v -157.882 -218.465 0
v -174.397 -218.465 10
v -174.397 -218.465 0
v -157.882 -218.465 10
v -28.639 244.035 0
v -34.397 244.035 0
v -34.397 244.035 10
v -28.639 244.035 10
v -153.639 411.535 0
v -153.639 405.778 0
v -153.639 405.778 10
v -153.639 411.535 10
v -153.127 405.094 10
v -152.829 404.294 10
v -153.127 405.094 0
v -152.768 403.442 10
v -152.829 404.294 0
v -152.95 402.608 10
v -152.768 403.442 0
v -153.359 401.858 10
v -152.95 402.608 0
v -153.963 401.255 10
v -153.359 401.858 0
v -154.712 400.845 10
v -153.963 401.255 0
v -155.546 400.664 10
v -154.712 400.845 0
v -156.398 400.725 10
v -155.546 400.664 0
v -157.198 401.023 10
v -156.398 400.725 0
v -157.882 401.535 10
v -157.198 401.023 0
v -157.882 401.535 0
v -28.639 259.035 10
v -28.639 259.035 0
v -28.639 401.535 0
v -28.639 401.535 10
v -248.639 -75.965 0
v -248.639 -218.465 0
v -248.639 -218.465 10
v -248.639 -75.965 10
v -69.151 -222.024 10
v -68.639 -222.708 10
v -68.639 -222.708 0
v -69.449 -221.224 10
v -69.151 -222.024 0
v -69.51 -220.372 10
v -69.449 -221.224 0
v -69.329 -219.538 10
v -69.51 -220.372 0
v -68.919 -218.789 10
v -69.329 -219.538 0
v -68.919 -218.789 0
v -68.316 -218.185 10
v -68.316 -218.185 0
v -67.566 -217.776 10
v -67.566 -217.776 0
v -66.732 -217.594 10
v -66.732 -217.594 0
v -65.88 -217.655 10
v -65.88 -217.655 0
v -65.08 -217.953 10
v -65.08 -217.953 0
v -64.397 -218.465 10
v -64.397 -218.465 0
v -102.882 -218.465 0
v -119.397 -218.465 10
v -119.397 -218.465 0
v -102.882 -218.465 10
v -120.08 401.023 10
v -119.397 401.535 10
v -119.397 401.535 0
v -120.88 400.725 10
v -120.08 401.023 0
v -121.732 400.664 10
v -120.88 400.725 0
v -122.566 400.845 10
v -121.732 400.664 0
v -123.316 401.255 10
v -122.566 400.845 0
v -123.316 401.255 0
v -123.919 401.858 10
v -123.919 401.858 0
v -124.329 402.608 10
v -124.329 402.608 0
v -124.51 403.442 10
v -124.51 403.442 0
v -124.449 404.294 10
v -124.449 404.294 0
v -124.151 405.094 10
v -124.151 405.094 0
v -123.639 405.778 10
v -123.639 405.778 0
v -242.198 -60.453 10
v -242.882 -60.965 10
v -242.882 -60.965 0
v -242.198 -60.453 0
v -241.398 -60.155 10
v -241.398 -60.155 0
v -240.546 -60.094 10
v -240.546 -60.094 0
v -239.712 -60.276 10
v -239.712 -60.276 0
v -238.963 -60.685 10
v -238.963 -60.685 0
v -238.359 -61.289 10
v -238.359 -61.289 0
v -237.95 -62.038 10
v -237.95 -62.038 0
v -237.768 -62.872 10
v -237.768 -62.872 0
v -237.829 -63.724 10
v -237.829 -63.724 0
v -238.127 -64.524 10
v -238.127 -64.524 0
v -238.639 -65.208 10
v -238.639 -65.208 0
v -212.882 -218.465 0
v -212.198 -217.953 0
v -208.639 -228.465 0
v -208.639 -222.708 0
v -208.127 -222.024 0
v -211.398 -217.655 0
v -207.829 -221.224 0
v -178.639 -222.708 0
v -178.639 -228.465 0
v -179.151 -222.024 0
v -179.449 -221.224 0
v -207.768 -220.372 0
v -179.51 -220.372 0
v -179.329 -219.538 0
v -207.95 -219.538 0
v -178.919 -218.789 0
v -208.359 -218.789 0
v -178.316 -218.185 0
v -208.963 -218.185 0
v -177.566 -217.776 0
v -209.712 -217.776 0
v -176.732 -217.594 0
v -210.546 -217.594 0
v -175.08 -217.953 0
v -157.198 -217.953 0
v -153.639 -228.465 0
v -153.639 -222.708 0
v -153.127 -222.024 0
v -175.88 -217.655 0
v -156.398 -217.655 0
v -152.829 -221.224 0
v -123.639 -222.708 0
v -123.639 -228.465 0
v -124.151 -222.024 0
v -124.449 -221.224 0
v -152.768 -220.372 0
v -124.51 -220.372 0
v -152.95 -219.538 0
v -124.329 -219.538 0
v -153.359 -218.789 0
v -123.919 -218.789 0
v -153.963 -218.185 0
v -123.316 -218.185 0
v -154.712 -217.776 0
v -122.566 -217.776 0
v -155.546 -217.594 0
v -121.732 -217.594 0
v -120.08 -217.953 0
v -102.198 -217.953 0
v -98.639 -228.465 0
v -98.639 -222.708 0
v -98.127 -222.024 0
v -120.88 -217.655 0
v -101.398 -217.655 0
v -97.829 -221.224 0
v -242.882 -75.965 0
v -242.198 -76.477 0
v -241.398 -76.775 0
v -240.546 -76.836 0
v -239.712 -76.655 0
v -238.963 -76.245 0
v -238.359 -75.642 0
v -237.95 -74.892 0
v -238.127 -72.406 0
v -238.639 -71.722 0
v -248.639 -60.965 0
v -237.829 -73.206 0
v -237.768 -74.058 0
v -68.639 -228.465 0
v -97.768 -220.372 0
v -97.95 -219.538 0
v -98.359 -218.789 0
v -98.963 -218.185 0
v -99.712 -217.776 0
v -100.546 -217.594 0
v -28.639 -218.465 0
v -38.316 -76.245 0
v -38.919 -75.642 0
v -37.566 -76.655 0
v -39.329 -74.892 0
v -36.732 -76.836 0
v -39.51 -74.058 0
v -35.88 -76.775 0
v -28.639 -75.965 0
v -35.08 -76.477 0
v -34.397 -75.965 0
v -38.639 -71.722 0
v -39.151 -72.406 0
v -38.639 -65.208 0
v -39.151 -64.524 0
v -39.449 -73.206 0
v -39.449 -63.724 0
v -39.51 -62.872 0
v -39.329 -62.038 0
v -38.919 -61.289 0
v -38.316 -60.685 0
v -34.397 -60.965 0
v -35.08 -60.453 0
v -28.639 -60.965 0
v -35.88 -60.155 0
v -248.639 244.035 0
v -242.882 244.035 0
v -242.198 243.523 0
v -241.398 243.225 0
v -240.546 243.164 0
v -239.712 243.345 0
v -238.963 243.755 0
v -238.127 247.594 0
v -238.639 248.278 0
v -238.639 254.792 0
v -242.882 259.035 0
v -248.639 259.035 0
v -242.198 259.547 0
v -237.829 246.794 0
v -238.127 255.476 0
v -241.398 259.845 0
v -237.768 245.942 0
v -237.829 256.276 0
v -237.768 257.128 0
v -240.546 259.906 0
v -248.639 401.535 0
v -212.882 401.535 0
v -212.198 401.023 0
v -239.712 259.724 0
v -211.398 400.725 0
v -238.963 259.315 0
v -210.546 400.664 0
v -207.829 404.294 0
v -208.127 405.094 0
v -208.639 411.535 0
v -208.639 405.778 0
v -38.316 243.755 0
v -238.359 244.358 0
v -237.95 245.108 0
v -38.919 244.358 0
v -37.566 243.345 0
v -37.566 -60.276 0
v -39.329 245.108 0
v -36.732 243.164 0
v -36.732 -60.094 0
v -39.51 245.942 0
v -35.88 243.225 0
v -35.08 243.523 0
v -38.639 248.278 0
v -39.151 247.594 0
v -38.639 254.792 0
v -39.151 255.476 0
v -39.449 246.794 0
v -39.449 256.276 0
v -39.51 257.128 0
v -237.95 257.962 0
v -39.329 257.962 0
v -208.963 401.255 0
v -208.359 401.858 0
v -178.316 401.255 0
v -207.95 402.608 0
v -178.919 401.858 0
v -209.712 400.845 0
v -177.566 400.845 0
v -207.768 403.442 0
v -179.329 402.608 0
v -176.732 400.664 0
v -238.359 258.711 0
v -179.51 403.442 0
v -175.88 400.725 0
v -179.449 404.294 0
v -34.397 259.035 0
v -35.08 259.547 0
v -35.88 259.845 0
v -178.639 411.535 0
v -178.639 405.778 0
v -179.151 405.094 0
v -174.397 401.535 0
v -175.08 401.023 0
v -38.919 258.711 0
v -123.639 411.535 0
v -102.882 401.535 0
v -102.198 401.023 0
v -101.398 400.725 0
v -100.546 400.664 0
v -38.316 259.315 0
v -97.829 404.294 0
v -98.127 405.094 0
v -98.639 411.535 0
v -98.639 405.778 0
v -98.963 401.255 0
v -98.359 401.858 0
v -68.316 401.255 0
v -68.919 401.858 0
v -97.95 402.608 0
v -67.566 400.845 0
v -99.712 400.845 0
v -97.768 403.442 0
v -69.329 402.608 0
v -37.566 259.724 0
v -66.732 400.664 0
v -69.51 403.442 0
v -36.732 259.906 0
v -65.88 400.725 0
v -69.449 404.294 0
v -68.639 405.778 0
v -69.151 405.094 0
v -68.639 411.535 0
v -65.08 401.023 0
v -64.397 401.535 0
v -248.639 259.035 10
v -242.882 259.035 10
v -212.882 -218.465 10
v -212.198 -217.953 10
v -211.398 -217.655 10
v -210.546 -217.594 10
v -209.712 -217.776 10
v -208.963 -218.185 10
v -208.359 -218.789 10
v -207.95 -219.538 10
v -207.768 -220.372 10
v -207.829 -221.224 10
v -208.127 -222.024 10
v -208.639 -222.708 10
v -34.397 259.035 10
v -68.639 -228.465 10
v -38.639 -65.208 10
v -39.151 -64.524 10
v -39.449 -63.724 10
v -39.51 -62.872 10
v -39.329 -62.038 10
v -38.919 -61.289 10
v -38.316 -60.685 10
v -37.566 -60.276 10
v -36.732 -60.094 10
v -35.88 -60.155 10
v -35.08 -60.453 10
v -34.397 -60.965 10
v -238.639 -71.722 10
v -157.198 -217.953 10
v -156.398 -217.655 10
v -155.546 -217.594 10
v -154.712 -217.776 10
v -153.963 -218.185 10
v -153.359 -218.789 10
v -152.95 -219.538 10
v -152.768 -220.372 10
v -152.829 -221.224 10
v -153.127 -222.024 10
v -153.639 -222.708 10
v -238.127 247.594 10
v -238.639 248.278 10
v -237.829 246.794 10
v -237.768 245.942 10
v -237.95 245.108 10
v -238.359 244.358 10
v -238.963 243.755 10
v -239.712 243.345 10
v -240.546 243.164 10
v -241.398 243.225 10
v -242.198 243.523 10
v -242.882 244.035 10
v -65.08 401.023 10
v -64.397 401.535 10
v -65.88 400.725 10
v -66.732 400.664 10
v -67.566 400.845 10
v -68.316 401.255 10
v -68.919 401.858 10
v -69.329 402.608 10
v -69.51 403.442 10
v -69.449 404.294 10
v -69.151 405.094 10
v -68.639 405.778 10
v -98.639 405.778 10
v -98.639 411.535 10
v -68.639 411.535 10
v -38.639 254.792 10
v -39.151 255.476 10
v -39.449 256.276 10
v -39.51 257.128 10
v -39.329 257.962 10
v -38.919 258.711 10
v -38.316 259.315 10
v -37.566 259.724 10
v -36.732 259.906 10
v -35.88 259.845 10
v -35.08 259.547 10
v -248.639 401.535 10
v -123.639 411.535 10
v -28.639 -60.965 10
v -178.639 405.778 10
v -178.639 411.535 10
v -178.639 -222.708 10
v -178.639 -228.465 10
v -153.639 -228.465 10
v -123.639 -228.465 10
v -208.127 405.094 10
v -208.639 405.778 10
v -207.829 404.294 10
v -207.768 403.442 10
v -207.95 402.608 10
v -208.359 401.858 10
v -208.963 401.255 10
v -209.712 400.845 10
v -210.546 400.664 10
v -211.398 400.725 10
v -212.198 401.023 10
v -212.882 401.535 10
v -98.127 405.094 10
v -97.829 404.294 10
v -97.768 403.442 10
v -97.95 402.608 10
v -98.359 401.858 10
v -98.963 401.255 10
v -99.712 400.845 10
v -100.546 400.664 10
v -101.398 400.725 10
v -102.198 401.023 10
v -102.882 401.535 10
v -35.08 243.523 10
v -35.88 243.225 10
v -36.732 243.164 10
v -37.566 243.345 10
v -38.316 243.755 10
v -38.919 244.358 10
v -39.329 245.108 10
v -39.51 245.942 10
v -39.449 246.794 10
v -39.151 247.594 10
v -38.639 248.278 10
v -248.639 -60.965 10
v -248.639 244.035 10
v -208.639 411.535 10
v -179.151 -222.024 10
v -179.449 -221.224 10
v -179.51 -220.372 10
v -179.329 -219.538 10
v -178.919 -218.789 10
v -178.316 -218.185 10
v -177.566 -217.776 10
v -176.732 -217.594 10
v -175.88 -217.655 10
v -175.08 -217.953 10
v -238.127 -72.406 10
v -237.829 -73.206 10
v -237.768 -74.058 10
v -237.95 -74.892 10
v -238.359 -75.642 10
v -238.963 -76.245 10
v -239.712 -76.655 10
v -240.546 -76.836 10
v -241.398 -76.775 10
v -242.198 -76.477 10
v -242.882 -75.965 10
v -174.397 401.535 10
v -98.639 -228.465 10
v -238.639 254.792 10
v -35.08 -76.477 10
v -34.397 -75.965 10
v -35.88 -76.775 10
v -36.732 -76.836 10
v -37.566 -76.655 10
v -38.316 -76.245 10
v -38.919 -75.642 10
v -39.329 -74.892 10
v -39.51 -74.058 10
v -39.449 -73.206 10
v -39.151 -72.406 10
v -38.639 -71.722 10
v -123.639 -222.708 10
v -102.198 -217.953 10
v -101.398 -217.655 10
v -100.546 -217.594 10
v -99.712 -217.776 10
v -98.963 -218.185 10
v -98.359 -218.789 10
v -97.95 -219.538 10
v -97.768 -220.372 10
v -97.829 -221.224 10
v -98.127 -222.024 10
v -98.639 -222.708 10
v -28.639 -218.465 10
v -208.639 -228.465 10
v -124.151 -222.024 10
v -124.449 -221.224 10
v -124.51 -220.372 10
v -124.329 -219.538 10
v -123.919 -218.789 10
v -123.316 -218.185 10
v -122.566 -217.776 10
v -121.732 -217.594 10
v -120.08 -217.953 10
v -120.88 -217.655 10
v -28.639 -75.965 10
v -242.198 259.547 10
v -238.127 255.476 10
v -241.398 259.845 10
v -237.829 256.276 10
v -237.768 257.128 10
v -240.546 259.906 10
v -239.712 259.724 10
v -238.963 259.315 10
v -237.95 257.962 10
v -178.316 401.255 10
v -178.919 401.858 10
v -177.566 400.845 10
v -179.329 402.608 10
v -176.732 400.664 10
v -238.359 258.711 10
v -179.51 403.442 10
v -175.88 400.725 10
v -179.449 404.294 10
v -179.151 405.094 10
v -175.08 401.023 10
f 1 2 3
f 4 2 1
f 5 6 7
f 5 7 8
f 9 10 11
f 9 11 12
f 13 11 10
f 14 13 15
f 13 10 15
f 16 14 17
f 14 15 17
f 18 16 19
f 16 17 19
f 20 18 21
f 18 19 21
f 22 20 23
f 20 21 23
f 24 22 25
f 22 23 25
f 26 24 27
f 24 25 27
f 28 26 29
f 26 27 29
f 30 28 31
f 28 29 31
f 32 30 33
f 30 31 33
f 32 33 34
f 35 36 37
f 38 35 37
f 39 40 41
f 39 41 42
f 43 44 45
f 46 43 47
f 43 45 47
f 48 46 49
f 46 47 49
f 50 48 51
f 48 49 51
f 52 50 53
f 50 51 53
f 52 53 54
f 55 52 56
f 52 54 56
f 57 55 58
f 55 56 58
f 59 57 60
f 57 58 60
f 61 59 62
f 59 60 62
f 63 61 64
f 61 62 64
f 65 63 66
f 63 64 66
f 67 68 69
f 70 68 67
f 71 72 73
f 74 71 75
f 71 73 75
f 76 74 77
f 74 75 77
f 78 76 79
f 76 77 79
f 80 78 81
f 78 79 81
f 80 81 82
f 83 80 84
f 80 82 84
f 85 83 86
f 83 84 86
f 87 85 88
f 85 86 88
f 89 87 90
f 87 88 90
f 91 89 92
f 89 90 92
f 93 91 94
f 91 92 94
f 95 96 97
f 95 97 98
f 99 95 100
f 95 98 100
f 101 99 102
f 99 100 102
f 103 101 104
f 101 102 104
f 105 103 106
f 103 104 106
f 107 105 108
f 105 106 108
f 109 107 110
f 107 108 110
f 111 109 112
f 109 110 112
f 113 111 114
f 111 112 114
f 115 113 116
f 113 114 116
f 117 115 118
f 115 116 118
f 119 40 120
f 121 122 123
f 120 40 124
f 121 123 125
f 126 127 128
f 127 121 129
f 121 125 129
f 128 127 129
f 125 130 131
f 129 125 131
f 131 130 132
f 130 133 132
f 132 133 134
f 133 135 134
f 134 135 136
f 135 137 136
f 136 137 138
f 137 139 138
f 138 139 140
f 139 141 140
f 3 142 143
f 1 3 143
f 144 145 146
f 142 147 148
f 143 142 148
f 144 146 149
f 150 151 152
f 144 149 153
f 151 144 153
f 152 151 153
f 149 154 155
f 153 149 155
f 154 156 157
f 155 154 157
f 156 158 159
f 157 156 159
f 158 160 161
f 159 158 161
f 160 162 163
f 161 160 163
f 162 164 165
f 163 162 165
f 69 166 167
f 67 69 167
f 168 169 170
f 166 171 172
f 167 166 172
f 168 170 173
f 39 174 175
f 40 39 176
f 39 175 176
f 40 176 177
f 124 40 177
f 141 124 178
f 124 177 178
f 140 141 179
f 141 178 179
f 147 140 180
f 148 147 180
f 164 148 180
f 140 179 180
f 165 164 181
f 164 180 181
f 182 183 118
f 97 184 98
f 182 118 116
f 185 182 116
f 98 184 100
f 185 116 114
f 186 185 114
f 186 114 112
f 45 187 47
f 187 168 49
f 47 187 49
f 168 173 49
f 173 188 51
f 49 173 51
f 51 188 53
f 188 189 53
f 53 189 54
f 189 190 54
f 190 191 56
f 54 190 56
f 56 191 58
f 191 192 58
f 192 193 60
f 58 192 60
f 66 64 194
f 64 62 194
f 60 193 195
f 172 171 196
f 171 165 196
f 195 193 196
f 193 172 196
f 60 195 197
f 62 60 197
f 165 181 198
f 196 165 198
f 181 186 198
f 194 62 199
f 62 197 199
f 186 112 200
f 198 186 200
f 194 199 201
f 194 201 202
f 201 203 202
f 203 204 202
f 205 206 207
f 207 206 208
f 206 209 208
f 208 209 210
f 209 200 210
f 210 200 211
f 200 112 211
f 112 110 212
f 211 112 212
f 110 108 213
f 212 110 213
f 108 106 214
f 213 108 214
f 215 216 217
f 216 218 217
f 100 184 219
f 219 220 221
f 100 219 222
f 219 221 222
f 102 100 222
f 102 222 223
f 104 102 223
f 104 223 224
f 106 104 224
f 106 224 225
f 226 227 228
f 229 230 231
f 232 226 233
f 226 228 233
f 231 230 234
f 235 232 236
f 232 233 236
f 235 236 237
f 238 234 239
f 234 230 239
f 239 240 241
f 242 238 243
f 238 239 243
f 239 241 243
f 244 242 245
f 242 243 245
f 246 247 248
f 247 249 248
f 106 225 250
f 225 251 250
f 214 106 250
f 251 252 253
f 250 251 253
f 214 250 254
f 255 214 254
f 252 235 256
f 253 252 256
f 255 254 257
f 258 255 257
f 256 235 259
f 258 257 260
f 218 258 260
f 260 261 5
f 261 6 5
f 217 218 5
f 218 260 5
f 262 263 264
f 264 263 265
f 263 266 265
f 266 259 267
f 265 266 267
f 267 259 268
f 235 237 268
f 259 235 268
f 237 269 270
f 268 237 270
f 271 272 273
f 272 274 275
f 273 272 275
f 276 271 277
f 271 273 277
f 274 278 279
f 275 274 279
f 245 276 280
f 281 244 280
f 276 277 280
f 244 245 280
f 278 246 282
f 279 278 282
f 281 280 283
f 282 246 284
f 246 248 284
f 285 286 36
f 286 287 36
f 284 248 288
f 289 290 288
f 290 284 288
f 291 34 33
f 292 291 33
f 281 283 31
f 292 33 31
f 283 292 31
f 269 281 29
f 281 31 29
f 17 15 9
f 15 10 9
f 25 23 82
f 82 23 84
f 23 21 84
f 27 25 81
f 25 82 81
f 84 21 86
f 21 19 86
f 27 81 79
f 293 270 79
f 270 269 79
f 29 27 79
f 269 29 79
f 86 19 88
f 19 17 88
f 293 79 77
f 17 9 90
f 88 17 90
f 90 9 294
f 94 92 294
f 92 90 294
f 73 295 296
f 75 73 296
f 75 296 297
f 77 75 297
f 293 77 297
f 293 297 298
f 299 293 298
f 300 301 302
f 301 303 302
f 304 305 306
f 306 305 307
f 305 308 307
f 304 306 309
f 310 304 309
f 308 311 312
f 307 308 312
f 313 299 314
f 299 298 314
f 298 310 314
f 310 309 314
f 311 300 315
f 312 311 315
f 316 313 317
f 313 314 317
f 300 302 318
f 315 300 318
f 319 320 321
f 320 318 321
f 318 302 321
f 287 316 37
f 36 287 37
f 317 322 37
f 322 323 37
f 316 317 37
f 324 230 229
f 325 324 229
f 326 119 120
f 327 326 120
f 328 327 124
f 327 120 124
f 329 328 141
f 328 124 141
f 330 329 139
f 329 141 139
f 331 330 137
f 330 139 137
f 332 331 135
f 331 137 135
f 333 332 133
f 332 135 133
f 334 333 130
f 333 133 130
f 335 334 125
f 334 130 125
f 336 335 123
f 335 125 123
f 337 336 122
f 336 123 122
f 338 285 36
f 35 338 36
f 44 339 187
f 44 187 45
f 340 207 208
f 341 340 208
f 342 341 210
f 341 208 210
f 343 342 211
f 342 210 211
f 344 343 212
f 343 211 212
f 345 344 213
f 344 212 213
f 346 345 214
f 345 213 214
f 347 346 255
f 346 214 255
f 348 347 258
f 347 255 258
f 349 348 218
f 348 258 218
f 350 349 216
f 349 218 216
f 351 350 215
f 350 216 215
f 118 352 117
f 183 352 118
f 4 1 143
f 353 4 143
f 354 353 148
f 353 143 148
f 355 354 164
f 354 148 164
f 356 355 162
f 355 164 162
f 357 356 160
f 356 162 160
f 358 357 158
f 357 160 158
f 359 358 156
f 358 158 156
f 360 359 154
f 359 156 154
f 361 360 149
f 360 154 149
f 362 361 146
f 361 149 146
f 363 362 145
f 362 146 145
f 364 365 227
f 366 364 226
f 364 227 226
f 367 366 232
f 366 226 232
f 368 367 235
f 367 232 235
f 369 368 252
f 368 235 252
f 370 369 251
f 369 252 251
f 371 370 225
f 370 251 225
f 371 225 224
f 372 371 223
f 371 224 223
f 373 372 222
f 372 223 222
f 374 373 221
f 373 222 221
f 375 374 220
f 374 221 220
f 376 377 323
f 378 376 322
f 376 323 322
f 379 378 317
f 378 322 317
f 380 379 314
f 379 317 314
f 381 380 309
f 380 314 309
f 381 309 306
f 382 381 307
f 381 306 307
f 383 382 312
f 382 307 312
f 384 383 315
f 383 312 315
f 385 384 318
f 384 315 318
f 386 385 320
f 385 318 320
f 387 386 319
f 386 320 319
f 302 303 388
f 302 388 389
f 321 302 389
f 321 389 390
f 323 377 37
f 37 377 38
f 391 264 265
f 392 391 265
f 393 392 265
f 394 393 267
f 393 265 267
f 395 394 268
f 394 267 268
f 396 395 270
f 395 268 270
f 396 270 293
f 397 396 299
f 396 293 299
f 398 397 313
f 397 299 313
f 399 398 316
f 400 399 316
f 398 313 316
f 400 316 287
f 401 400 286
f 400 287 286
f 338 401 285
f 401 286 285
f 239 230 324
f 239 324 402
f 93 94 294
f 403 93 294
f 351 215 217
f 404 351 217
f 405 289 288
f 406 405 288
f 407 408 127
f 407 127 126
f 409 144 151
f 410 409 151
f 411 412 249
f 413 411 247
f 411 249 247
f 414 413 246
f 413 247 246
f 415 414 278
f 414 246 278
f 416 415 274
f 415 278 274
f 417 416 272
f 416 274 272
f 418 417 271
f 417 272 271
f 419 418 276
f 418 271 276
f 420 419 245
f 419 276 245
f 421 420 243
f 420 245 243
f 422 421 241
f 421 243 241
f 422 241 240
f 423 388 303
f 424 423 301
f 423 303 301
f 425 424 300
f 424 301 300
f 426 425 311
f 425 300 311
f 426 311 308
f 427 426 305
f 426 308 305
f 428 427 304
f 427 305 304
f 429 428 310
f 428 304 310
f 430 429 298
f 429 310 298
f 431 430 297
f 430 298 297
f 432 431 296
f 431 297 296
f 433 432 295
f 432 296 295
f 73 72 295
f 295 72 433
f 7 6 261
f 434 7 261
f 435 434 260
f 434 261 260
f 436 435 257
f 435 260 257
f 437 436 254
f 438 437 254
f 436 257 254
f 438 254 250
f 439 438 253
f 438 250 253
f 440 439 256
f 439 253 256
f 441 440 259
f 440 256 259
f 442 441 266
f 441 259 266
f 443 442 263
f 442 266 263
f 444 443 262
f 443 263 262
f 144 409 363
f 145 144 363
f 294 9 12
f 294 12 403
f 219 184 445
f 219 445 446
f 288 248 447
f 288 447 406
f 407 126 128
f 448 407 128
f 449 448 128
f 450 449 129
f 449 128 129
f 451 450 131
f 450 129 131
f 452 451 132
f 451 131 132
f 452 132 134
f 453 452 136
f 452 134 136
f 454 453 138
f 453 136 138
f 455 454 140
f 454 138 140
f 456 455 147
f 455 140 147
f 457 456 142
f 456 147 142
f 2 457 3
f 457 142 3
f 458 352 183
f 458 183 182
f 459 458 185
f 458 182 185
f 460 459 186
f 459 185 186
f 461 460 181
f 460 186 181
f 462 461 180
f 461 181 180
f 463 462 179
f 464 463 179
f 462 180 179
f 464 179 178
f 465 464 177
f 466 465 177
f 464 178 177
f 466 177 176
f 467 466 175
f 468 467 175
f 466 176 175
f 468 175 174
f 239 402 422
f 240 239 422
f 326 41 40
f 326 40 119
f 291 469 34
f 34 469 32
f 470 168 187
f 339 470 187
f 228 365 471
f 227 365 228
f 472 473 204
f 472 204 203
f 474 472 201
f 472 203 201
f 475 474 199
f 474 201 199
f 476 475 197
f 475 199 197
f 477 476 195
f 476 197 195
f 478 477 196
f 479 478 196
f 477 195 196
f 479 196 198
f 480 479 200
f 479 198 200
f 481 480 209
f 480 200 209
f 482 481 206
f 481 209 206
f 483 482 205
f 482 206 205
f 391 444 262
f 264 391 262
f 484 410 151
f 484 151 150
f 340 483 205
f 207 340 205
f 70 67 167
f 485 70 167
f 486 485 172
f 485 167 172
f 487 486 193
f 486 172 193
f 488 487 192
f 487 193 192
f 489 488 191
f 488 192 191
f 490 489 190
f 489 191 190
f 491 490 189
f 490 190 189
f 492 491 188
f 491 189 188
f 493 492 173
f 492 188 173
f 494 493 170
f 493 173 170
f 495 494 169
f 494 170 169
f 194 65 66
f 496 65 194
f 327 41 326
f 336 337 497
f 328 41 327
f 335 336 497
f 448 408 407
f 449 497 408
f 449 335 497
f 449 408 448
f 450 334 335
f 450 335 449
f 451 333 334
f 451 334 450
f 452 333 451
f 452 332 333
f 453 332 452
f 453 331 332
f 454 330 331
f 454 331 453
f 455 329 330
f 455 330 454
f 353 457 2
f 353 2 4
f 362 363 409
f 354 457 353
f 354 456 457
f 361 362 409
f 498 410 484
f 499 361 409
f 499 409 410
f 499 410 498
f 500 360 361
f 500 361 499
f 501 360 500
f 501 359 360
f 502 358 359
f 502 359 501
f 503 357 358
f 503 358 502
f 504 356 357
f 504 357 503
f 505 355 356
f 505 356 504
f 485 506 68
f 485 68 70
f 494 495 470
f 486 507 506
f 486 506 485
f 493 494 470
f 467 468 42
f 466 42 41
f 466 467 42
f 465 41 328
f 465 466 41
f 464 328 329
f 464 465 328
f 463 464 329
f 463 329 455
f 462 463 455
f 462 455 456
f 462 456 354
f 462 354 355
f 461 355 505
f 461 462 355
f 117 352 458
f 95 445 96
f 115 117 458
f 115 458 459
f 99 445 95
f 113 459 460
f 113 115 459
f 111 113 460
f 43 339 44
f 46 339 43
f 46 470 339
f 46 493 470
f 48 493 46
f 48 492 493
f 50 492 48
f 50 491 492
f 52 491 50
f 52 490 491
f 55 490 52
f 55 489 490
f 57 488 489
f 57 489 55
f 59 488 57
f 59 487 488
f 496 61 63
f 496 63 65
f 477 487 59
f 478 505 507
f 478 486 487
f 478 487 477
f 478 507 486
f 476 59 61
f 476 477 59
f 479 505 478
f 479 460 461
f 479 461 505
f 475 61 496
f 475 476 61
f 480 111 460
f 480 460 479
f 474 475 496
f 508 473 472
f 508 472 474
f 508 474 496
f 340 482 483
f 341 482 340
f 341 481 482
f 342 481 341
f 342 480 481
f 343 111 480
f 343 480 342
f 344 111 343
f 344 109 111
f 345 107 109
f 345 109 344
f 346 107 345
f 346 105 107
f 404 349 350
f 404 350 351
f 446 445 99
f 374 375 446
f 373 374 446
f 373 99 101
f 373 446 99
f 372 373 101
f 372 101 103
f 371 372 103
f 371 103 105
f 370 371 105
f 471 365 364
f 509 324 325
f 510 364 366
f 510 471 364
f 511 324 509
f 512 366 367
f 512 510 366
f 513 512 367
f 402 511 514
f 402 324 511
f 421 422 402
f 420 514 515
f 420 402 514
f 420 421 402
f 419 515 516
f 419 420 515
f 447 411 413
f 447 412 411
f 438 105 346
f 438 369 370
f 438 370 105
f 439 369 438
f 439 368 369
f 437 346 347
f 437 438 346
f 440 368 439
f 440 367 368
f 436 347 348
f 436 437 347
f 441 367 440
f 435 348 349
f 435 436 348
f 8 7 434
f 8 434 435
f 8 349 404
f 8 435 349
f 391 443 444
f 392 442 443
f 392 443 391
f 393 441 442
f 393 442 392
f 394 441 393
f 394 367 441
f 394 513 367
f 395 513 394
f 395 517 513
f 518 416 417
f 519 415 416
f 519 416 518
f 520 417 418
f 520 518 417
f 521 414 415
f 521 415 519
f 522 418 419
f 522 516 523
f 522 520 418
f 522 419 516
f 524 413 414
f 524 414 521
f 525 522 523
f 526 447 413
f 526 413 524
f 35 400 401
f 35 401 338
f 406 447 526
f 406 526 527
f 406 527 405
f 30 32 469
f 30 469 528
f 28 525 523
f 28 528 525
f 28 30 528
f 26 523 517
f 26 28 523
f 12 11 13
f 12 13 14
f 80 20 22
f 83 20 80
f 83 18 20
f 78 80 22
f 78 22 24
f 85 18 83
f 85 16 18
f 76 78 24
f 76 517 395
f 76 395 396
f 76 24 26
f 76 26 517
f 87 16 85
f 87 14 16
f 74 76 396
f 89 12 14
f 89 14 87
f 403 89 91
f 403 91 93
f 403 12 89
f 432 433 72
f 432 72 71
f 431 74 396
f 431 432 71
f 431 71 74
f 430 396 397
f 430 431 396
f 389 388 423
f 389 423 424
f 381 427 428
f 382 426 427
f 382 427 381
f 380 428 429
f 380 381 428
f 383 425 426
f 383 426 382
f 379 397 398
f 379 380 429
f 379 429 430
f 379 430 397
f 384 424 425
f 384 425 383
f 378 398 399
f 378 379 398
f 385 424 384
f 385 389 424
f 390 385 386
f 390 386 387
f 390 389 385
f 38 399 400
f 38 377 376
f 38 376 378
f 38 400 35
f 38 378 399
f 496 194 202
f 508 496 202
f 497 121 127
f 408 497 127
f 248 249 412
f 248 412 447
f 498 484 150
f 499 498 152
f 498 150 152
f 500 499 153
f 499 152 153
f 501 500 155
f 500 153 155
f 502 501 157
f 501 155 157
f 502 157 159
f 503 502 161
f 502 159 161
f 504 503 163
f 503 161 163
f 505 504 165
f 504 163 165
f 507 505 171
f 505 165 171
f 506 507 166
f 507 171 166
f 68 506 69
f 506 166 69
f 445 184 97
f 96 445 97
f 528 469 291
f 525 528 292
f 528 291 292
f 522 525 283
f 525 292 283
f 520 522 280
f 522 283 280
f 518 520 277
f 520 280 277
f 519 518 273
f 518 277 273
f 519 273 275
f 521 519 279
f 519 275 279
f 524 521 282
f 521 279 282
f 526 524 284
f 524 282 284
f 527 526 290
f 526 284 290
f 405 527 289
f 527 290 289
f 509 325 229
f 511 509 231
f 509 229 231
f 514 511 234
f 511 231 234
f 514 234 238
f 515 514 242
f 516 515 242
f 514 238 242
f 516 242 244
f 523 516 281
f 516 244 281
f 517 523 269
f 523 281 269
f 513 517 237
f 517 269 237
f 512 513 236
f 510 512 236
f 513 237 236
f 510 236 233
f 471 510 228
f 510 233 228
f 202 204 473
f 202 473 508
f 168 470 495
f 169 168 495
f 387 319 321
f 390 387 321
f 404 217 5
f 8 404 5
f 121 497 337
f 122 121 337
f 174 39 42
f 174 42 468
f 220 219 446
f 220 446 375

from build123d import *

# Parameters (mm, degrees)
SKETCH3_W           = 220
SKETCH3_H           = 640
BOSS_EXTRUDE1_DEPTH = 10
SKETCH4_W           = 40
SKETCH4_H           = 10
SKETCH4_W_2         = 25
CUT_EXTRUDE1_DEPTH  = 18
CAVITY1_START       = -75.965089032
CAVITY1_OUTLINE_W   = 10
CAVITY1_OUTLINE_H   = 10
CAVITY1_DEPTH       = 15
CAVITY1_START_2     = 244.034910968
CAVITY1_2_OUTLINE_W = 10
CAVITY1_2_OUTLINE_H = 10
CAVITY1_2_DEPTH     = 15
SKETCH7_R           = 3
CUT_EXTRUDE4_DEPTH  = 10


# Read off the part's stored shape, not the designer's step: Cavity1
with BuildPart() as part:
    # Sketch3 → Boss-Extrude1 (new body)
    with BuildSketch(Plane.XY):
        with Locations((-138.639194455, 91.534910968)):
            Rectangle(SKETCH3_W, SKETCH3_H)
    extrude(amount=BOSS_EXTRUDE1_DEPTH)

    # Sketch4 → Cut-Extrude1 (cut)
    with BuildSketch(Plane.XY.offset(10)):
        with Locations((-228.639194455, 406.534910968)):
            Rectangle(SKETCH4_W, SKETCH4_H)
        with Locations((-166.139194455, 406.534910968)):
            Rectangle(SKETCH4_W_2, SKETCH4_H)
        with Locations((-111.139194455, 406.534910968)):
            Rectangle(SKETCH4_W_2, SKETCH4_H)
        with Locations((-48.639194455, 406.534910968)):
            Rectangle(SKETCH4_W, SKETCH4_H)
        with Locations((-48.639194455, -223.465089032)):
            Rectangle(SKETCH4_W, SKETCH4_H)
        with Locations((-111.139194455, -223.465089032)):
            Rectangle(SKETCH4_W_2, SKETCH4_H)
        with Locations((-166.139194455, -223.465089032)):
            Rectangle(SKETCH4_W_2, SKETCH4_H)
        with Locations((-228.639194455, -223.465089032)):
            Rectangle(SKETCH4_W, SKETCH4_H)
    extrude(amount=-CUT_EXTRUDE1_DEPTH, mode=Mode.SUBTRACT)

    # Cavity1 outline → Cavity1 (cut)
    with BuildSketch(Plane(origin=(0, 0, 0), x_dir=(1, 0, 0), z_dir=(0, 1, 0)).offset(CAVITY1_START)):
        with Locations((-33.639194455, -5)):
            Rectangle(CAVITY1_OUTLINE_W, CAVITY1_OUTLINE_H)
        with Locations((-243.639194455, -5)):
            Rectangle(CAVITY1_OUTLINE_W, CAVITY1_OUTLINE_H)
    extrude(amount=CAVITY1_DEPTH, mode=Mode.SUBTRACT)

    # Cavity1 2 outline → Cavity1 2 (cut)
    with BuildSketch(Plane(origin=(0, 0, 0), x_dir=(1, 0, 0), z_dir=(0, 1, 0)).offset(CAVITY1_START_2)):
        with Locations((-33.639194455, -5)):
            Rectangle(CAVITY1_2_OUTLINE_W, CAVITY1_2_OUTLINE_H)
        with Locations((-243.639194455, -5)):
            Rectangle(CAVITY1_2_OUTLINE_W, CAVITY1_2_OUTLINE_H)
    extrude(amount=CAVITY1_2_DEPTH, mode=Mode.SUBTRACT)

    # Sketch7 → Cut-Extrude4 (cut)
    with BuildSketch(Plane(origin=(0, 0, 0), x_dir=(-1, 0, 0), z_dir=(0, 0, -1))):
        with Locations((36.517874112, -63.086409375)):
            Circle(SKETCH7_R)
        with Locations((36.517874112, -73.843768688)):
            Circle(SKETCH7_R)
        with Locations((240.760514799, -63.086409375)):
            Circle(SKETCH7_R)
        with Locations((240.760514799, -73.843768688)):
            Circle(SKETCH7_R)
        with Locations((240.760514799, 256.913590625)):
            Circle(SKETCH7_R)
        with Locations((240.760514799, 246.156231312)):
            Circle(SKETCH7_R)
        with Locations((36.517874112, 256.913590625)):
            Circle(SKETCH7_R)
        with Locations((36.517874112, 246.156231312)):
            Circle(SKETCH7_R)
        with Locations((121.517874112, 403.656231312)):
            Circle(SKETCH7_R)
        with Locations((66.517874112, 403.656231312)):
            Circle(SKETCH7_R)
        with Locations((100.760514799, 403.656231312)):
            Circle(SKETCH7_R)
        with Locations((210.760514799, 403.656231312)):
            Circle(SKETCH7_R)
        with Locations((155.760514799, 403.656231312)):
            Circle(SKETCH7_R)
        with Locations((176.517874112, 403.656231312)):
            Circle(SKETCH7_R)
        with Locations((121.517874112, -220.586409375)):
            Circle(SKETCH7_R)
        with Locations((66.517874112, -220.586409375)):
            Circle(SKETCH7_R)
        with Locations((100.760514799, -220.586409375)):
            Circle(SKETCH7_R)
        with Locations((155.760514799, -220.586409375)):
            Circle(SKETCH7_R)
        with Locations((176.517874112, -220.586409375)):
            Circle(SKETCH7_R)
        with Locations((210.760514799, -220.586409375)):
            Circle(SKETCH7_R)
    extrude(amount=-CUT_EXTRUDE4_DEPTH, mode=Mode.SUBTRACT)


solid = part.part
